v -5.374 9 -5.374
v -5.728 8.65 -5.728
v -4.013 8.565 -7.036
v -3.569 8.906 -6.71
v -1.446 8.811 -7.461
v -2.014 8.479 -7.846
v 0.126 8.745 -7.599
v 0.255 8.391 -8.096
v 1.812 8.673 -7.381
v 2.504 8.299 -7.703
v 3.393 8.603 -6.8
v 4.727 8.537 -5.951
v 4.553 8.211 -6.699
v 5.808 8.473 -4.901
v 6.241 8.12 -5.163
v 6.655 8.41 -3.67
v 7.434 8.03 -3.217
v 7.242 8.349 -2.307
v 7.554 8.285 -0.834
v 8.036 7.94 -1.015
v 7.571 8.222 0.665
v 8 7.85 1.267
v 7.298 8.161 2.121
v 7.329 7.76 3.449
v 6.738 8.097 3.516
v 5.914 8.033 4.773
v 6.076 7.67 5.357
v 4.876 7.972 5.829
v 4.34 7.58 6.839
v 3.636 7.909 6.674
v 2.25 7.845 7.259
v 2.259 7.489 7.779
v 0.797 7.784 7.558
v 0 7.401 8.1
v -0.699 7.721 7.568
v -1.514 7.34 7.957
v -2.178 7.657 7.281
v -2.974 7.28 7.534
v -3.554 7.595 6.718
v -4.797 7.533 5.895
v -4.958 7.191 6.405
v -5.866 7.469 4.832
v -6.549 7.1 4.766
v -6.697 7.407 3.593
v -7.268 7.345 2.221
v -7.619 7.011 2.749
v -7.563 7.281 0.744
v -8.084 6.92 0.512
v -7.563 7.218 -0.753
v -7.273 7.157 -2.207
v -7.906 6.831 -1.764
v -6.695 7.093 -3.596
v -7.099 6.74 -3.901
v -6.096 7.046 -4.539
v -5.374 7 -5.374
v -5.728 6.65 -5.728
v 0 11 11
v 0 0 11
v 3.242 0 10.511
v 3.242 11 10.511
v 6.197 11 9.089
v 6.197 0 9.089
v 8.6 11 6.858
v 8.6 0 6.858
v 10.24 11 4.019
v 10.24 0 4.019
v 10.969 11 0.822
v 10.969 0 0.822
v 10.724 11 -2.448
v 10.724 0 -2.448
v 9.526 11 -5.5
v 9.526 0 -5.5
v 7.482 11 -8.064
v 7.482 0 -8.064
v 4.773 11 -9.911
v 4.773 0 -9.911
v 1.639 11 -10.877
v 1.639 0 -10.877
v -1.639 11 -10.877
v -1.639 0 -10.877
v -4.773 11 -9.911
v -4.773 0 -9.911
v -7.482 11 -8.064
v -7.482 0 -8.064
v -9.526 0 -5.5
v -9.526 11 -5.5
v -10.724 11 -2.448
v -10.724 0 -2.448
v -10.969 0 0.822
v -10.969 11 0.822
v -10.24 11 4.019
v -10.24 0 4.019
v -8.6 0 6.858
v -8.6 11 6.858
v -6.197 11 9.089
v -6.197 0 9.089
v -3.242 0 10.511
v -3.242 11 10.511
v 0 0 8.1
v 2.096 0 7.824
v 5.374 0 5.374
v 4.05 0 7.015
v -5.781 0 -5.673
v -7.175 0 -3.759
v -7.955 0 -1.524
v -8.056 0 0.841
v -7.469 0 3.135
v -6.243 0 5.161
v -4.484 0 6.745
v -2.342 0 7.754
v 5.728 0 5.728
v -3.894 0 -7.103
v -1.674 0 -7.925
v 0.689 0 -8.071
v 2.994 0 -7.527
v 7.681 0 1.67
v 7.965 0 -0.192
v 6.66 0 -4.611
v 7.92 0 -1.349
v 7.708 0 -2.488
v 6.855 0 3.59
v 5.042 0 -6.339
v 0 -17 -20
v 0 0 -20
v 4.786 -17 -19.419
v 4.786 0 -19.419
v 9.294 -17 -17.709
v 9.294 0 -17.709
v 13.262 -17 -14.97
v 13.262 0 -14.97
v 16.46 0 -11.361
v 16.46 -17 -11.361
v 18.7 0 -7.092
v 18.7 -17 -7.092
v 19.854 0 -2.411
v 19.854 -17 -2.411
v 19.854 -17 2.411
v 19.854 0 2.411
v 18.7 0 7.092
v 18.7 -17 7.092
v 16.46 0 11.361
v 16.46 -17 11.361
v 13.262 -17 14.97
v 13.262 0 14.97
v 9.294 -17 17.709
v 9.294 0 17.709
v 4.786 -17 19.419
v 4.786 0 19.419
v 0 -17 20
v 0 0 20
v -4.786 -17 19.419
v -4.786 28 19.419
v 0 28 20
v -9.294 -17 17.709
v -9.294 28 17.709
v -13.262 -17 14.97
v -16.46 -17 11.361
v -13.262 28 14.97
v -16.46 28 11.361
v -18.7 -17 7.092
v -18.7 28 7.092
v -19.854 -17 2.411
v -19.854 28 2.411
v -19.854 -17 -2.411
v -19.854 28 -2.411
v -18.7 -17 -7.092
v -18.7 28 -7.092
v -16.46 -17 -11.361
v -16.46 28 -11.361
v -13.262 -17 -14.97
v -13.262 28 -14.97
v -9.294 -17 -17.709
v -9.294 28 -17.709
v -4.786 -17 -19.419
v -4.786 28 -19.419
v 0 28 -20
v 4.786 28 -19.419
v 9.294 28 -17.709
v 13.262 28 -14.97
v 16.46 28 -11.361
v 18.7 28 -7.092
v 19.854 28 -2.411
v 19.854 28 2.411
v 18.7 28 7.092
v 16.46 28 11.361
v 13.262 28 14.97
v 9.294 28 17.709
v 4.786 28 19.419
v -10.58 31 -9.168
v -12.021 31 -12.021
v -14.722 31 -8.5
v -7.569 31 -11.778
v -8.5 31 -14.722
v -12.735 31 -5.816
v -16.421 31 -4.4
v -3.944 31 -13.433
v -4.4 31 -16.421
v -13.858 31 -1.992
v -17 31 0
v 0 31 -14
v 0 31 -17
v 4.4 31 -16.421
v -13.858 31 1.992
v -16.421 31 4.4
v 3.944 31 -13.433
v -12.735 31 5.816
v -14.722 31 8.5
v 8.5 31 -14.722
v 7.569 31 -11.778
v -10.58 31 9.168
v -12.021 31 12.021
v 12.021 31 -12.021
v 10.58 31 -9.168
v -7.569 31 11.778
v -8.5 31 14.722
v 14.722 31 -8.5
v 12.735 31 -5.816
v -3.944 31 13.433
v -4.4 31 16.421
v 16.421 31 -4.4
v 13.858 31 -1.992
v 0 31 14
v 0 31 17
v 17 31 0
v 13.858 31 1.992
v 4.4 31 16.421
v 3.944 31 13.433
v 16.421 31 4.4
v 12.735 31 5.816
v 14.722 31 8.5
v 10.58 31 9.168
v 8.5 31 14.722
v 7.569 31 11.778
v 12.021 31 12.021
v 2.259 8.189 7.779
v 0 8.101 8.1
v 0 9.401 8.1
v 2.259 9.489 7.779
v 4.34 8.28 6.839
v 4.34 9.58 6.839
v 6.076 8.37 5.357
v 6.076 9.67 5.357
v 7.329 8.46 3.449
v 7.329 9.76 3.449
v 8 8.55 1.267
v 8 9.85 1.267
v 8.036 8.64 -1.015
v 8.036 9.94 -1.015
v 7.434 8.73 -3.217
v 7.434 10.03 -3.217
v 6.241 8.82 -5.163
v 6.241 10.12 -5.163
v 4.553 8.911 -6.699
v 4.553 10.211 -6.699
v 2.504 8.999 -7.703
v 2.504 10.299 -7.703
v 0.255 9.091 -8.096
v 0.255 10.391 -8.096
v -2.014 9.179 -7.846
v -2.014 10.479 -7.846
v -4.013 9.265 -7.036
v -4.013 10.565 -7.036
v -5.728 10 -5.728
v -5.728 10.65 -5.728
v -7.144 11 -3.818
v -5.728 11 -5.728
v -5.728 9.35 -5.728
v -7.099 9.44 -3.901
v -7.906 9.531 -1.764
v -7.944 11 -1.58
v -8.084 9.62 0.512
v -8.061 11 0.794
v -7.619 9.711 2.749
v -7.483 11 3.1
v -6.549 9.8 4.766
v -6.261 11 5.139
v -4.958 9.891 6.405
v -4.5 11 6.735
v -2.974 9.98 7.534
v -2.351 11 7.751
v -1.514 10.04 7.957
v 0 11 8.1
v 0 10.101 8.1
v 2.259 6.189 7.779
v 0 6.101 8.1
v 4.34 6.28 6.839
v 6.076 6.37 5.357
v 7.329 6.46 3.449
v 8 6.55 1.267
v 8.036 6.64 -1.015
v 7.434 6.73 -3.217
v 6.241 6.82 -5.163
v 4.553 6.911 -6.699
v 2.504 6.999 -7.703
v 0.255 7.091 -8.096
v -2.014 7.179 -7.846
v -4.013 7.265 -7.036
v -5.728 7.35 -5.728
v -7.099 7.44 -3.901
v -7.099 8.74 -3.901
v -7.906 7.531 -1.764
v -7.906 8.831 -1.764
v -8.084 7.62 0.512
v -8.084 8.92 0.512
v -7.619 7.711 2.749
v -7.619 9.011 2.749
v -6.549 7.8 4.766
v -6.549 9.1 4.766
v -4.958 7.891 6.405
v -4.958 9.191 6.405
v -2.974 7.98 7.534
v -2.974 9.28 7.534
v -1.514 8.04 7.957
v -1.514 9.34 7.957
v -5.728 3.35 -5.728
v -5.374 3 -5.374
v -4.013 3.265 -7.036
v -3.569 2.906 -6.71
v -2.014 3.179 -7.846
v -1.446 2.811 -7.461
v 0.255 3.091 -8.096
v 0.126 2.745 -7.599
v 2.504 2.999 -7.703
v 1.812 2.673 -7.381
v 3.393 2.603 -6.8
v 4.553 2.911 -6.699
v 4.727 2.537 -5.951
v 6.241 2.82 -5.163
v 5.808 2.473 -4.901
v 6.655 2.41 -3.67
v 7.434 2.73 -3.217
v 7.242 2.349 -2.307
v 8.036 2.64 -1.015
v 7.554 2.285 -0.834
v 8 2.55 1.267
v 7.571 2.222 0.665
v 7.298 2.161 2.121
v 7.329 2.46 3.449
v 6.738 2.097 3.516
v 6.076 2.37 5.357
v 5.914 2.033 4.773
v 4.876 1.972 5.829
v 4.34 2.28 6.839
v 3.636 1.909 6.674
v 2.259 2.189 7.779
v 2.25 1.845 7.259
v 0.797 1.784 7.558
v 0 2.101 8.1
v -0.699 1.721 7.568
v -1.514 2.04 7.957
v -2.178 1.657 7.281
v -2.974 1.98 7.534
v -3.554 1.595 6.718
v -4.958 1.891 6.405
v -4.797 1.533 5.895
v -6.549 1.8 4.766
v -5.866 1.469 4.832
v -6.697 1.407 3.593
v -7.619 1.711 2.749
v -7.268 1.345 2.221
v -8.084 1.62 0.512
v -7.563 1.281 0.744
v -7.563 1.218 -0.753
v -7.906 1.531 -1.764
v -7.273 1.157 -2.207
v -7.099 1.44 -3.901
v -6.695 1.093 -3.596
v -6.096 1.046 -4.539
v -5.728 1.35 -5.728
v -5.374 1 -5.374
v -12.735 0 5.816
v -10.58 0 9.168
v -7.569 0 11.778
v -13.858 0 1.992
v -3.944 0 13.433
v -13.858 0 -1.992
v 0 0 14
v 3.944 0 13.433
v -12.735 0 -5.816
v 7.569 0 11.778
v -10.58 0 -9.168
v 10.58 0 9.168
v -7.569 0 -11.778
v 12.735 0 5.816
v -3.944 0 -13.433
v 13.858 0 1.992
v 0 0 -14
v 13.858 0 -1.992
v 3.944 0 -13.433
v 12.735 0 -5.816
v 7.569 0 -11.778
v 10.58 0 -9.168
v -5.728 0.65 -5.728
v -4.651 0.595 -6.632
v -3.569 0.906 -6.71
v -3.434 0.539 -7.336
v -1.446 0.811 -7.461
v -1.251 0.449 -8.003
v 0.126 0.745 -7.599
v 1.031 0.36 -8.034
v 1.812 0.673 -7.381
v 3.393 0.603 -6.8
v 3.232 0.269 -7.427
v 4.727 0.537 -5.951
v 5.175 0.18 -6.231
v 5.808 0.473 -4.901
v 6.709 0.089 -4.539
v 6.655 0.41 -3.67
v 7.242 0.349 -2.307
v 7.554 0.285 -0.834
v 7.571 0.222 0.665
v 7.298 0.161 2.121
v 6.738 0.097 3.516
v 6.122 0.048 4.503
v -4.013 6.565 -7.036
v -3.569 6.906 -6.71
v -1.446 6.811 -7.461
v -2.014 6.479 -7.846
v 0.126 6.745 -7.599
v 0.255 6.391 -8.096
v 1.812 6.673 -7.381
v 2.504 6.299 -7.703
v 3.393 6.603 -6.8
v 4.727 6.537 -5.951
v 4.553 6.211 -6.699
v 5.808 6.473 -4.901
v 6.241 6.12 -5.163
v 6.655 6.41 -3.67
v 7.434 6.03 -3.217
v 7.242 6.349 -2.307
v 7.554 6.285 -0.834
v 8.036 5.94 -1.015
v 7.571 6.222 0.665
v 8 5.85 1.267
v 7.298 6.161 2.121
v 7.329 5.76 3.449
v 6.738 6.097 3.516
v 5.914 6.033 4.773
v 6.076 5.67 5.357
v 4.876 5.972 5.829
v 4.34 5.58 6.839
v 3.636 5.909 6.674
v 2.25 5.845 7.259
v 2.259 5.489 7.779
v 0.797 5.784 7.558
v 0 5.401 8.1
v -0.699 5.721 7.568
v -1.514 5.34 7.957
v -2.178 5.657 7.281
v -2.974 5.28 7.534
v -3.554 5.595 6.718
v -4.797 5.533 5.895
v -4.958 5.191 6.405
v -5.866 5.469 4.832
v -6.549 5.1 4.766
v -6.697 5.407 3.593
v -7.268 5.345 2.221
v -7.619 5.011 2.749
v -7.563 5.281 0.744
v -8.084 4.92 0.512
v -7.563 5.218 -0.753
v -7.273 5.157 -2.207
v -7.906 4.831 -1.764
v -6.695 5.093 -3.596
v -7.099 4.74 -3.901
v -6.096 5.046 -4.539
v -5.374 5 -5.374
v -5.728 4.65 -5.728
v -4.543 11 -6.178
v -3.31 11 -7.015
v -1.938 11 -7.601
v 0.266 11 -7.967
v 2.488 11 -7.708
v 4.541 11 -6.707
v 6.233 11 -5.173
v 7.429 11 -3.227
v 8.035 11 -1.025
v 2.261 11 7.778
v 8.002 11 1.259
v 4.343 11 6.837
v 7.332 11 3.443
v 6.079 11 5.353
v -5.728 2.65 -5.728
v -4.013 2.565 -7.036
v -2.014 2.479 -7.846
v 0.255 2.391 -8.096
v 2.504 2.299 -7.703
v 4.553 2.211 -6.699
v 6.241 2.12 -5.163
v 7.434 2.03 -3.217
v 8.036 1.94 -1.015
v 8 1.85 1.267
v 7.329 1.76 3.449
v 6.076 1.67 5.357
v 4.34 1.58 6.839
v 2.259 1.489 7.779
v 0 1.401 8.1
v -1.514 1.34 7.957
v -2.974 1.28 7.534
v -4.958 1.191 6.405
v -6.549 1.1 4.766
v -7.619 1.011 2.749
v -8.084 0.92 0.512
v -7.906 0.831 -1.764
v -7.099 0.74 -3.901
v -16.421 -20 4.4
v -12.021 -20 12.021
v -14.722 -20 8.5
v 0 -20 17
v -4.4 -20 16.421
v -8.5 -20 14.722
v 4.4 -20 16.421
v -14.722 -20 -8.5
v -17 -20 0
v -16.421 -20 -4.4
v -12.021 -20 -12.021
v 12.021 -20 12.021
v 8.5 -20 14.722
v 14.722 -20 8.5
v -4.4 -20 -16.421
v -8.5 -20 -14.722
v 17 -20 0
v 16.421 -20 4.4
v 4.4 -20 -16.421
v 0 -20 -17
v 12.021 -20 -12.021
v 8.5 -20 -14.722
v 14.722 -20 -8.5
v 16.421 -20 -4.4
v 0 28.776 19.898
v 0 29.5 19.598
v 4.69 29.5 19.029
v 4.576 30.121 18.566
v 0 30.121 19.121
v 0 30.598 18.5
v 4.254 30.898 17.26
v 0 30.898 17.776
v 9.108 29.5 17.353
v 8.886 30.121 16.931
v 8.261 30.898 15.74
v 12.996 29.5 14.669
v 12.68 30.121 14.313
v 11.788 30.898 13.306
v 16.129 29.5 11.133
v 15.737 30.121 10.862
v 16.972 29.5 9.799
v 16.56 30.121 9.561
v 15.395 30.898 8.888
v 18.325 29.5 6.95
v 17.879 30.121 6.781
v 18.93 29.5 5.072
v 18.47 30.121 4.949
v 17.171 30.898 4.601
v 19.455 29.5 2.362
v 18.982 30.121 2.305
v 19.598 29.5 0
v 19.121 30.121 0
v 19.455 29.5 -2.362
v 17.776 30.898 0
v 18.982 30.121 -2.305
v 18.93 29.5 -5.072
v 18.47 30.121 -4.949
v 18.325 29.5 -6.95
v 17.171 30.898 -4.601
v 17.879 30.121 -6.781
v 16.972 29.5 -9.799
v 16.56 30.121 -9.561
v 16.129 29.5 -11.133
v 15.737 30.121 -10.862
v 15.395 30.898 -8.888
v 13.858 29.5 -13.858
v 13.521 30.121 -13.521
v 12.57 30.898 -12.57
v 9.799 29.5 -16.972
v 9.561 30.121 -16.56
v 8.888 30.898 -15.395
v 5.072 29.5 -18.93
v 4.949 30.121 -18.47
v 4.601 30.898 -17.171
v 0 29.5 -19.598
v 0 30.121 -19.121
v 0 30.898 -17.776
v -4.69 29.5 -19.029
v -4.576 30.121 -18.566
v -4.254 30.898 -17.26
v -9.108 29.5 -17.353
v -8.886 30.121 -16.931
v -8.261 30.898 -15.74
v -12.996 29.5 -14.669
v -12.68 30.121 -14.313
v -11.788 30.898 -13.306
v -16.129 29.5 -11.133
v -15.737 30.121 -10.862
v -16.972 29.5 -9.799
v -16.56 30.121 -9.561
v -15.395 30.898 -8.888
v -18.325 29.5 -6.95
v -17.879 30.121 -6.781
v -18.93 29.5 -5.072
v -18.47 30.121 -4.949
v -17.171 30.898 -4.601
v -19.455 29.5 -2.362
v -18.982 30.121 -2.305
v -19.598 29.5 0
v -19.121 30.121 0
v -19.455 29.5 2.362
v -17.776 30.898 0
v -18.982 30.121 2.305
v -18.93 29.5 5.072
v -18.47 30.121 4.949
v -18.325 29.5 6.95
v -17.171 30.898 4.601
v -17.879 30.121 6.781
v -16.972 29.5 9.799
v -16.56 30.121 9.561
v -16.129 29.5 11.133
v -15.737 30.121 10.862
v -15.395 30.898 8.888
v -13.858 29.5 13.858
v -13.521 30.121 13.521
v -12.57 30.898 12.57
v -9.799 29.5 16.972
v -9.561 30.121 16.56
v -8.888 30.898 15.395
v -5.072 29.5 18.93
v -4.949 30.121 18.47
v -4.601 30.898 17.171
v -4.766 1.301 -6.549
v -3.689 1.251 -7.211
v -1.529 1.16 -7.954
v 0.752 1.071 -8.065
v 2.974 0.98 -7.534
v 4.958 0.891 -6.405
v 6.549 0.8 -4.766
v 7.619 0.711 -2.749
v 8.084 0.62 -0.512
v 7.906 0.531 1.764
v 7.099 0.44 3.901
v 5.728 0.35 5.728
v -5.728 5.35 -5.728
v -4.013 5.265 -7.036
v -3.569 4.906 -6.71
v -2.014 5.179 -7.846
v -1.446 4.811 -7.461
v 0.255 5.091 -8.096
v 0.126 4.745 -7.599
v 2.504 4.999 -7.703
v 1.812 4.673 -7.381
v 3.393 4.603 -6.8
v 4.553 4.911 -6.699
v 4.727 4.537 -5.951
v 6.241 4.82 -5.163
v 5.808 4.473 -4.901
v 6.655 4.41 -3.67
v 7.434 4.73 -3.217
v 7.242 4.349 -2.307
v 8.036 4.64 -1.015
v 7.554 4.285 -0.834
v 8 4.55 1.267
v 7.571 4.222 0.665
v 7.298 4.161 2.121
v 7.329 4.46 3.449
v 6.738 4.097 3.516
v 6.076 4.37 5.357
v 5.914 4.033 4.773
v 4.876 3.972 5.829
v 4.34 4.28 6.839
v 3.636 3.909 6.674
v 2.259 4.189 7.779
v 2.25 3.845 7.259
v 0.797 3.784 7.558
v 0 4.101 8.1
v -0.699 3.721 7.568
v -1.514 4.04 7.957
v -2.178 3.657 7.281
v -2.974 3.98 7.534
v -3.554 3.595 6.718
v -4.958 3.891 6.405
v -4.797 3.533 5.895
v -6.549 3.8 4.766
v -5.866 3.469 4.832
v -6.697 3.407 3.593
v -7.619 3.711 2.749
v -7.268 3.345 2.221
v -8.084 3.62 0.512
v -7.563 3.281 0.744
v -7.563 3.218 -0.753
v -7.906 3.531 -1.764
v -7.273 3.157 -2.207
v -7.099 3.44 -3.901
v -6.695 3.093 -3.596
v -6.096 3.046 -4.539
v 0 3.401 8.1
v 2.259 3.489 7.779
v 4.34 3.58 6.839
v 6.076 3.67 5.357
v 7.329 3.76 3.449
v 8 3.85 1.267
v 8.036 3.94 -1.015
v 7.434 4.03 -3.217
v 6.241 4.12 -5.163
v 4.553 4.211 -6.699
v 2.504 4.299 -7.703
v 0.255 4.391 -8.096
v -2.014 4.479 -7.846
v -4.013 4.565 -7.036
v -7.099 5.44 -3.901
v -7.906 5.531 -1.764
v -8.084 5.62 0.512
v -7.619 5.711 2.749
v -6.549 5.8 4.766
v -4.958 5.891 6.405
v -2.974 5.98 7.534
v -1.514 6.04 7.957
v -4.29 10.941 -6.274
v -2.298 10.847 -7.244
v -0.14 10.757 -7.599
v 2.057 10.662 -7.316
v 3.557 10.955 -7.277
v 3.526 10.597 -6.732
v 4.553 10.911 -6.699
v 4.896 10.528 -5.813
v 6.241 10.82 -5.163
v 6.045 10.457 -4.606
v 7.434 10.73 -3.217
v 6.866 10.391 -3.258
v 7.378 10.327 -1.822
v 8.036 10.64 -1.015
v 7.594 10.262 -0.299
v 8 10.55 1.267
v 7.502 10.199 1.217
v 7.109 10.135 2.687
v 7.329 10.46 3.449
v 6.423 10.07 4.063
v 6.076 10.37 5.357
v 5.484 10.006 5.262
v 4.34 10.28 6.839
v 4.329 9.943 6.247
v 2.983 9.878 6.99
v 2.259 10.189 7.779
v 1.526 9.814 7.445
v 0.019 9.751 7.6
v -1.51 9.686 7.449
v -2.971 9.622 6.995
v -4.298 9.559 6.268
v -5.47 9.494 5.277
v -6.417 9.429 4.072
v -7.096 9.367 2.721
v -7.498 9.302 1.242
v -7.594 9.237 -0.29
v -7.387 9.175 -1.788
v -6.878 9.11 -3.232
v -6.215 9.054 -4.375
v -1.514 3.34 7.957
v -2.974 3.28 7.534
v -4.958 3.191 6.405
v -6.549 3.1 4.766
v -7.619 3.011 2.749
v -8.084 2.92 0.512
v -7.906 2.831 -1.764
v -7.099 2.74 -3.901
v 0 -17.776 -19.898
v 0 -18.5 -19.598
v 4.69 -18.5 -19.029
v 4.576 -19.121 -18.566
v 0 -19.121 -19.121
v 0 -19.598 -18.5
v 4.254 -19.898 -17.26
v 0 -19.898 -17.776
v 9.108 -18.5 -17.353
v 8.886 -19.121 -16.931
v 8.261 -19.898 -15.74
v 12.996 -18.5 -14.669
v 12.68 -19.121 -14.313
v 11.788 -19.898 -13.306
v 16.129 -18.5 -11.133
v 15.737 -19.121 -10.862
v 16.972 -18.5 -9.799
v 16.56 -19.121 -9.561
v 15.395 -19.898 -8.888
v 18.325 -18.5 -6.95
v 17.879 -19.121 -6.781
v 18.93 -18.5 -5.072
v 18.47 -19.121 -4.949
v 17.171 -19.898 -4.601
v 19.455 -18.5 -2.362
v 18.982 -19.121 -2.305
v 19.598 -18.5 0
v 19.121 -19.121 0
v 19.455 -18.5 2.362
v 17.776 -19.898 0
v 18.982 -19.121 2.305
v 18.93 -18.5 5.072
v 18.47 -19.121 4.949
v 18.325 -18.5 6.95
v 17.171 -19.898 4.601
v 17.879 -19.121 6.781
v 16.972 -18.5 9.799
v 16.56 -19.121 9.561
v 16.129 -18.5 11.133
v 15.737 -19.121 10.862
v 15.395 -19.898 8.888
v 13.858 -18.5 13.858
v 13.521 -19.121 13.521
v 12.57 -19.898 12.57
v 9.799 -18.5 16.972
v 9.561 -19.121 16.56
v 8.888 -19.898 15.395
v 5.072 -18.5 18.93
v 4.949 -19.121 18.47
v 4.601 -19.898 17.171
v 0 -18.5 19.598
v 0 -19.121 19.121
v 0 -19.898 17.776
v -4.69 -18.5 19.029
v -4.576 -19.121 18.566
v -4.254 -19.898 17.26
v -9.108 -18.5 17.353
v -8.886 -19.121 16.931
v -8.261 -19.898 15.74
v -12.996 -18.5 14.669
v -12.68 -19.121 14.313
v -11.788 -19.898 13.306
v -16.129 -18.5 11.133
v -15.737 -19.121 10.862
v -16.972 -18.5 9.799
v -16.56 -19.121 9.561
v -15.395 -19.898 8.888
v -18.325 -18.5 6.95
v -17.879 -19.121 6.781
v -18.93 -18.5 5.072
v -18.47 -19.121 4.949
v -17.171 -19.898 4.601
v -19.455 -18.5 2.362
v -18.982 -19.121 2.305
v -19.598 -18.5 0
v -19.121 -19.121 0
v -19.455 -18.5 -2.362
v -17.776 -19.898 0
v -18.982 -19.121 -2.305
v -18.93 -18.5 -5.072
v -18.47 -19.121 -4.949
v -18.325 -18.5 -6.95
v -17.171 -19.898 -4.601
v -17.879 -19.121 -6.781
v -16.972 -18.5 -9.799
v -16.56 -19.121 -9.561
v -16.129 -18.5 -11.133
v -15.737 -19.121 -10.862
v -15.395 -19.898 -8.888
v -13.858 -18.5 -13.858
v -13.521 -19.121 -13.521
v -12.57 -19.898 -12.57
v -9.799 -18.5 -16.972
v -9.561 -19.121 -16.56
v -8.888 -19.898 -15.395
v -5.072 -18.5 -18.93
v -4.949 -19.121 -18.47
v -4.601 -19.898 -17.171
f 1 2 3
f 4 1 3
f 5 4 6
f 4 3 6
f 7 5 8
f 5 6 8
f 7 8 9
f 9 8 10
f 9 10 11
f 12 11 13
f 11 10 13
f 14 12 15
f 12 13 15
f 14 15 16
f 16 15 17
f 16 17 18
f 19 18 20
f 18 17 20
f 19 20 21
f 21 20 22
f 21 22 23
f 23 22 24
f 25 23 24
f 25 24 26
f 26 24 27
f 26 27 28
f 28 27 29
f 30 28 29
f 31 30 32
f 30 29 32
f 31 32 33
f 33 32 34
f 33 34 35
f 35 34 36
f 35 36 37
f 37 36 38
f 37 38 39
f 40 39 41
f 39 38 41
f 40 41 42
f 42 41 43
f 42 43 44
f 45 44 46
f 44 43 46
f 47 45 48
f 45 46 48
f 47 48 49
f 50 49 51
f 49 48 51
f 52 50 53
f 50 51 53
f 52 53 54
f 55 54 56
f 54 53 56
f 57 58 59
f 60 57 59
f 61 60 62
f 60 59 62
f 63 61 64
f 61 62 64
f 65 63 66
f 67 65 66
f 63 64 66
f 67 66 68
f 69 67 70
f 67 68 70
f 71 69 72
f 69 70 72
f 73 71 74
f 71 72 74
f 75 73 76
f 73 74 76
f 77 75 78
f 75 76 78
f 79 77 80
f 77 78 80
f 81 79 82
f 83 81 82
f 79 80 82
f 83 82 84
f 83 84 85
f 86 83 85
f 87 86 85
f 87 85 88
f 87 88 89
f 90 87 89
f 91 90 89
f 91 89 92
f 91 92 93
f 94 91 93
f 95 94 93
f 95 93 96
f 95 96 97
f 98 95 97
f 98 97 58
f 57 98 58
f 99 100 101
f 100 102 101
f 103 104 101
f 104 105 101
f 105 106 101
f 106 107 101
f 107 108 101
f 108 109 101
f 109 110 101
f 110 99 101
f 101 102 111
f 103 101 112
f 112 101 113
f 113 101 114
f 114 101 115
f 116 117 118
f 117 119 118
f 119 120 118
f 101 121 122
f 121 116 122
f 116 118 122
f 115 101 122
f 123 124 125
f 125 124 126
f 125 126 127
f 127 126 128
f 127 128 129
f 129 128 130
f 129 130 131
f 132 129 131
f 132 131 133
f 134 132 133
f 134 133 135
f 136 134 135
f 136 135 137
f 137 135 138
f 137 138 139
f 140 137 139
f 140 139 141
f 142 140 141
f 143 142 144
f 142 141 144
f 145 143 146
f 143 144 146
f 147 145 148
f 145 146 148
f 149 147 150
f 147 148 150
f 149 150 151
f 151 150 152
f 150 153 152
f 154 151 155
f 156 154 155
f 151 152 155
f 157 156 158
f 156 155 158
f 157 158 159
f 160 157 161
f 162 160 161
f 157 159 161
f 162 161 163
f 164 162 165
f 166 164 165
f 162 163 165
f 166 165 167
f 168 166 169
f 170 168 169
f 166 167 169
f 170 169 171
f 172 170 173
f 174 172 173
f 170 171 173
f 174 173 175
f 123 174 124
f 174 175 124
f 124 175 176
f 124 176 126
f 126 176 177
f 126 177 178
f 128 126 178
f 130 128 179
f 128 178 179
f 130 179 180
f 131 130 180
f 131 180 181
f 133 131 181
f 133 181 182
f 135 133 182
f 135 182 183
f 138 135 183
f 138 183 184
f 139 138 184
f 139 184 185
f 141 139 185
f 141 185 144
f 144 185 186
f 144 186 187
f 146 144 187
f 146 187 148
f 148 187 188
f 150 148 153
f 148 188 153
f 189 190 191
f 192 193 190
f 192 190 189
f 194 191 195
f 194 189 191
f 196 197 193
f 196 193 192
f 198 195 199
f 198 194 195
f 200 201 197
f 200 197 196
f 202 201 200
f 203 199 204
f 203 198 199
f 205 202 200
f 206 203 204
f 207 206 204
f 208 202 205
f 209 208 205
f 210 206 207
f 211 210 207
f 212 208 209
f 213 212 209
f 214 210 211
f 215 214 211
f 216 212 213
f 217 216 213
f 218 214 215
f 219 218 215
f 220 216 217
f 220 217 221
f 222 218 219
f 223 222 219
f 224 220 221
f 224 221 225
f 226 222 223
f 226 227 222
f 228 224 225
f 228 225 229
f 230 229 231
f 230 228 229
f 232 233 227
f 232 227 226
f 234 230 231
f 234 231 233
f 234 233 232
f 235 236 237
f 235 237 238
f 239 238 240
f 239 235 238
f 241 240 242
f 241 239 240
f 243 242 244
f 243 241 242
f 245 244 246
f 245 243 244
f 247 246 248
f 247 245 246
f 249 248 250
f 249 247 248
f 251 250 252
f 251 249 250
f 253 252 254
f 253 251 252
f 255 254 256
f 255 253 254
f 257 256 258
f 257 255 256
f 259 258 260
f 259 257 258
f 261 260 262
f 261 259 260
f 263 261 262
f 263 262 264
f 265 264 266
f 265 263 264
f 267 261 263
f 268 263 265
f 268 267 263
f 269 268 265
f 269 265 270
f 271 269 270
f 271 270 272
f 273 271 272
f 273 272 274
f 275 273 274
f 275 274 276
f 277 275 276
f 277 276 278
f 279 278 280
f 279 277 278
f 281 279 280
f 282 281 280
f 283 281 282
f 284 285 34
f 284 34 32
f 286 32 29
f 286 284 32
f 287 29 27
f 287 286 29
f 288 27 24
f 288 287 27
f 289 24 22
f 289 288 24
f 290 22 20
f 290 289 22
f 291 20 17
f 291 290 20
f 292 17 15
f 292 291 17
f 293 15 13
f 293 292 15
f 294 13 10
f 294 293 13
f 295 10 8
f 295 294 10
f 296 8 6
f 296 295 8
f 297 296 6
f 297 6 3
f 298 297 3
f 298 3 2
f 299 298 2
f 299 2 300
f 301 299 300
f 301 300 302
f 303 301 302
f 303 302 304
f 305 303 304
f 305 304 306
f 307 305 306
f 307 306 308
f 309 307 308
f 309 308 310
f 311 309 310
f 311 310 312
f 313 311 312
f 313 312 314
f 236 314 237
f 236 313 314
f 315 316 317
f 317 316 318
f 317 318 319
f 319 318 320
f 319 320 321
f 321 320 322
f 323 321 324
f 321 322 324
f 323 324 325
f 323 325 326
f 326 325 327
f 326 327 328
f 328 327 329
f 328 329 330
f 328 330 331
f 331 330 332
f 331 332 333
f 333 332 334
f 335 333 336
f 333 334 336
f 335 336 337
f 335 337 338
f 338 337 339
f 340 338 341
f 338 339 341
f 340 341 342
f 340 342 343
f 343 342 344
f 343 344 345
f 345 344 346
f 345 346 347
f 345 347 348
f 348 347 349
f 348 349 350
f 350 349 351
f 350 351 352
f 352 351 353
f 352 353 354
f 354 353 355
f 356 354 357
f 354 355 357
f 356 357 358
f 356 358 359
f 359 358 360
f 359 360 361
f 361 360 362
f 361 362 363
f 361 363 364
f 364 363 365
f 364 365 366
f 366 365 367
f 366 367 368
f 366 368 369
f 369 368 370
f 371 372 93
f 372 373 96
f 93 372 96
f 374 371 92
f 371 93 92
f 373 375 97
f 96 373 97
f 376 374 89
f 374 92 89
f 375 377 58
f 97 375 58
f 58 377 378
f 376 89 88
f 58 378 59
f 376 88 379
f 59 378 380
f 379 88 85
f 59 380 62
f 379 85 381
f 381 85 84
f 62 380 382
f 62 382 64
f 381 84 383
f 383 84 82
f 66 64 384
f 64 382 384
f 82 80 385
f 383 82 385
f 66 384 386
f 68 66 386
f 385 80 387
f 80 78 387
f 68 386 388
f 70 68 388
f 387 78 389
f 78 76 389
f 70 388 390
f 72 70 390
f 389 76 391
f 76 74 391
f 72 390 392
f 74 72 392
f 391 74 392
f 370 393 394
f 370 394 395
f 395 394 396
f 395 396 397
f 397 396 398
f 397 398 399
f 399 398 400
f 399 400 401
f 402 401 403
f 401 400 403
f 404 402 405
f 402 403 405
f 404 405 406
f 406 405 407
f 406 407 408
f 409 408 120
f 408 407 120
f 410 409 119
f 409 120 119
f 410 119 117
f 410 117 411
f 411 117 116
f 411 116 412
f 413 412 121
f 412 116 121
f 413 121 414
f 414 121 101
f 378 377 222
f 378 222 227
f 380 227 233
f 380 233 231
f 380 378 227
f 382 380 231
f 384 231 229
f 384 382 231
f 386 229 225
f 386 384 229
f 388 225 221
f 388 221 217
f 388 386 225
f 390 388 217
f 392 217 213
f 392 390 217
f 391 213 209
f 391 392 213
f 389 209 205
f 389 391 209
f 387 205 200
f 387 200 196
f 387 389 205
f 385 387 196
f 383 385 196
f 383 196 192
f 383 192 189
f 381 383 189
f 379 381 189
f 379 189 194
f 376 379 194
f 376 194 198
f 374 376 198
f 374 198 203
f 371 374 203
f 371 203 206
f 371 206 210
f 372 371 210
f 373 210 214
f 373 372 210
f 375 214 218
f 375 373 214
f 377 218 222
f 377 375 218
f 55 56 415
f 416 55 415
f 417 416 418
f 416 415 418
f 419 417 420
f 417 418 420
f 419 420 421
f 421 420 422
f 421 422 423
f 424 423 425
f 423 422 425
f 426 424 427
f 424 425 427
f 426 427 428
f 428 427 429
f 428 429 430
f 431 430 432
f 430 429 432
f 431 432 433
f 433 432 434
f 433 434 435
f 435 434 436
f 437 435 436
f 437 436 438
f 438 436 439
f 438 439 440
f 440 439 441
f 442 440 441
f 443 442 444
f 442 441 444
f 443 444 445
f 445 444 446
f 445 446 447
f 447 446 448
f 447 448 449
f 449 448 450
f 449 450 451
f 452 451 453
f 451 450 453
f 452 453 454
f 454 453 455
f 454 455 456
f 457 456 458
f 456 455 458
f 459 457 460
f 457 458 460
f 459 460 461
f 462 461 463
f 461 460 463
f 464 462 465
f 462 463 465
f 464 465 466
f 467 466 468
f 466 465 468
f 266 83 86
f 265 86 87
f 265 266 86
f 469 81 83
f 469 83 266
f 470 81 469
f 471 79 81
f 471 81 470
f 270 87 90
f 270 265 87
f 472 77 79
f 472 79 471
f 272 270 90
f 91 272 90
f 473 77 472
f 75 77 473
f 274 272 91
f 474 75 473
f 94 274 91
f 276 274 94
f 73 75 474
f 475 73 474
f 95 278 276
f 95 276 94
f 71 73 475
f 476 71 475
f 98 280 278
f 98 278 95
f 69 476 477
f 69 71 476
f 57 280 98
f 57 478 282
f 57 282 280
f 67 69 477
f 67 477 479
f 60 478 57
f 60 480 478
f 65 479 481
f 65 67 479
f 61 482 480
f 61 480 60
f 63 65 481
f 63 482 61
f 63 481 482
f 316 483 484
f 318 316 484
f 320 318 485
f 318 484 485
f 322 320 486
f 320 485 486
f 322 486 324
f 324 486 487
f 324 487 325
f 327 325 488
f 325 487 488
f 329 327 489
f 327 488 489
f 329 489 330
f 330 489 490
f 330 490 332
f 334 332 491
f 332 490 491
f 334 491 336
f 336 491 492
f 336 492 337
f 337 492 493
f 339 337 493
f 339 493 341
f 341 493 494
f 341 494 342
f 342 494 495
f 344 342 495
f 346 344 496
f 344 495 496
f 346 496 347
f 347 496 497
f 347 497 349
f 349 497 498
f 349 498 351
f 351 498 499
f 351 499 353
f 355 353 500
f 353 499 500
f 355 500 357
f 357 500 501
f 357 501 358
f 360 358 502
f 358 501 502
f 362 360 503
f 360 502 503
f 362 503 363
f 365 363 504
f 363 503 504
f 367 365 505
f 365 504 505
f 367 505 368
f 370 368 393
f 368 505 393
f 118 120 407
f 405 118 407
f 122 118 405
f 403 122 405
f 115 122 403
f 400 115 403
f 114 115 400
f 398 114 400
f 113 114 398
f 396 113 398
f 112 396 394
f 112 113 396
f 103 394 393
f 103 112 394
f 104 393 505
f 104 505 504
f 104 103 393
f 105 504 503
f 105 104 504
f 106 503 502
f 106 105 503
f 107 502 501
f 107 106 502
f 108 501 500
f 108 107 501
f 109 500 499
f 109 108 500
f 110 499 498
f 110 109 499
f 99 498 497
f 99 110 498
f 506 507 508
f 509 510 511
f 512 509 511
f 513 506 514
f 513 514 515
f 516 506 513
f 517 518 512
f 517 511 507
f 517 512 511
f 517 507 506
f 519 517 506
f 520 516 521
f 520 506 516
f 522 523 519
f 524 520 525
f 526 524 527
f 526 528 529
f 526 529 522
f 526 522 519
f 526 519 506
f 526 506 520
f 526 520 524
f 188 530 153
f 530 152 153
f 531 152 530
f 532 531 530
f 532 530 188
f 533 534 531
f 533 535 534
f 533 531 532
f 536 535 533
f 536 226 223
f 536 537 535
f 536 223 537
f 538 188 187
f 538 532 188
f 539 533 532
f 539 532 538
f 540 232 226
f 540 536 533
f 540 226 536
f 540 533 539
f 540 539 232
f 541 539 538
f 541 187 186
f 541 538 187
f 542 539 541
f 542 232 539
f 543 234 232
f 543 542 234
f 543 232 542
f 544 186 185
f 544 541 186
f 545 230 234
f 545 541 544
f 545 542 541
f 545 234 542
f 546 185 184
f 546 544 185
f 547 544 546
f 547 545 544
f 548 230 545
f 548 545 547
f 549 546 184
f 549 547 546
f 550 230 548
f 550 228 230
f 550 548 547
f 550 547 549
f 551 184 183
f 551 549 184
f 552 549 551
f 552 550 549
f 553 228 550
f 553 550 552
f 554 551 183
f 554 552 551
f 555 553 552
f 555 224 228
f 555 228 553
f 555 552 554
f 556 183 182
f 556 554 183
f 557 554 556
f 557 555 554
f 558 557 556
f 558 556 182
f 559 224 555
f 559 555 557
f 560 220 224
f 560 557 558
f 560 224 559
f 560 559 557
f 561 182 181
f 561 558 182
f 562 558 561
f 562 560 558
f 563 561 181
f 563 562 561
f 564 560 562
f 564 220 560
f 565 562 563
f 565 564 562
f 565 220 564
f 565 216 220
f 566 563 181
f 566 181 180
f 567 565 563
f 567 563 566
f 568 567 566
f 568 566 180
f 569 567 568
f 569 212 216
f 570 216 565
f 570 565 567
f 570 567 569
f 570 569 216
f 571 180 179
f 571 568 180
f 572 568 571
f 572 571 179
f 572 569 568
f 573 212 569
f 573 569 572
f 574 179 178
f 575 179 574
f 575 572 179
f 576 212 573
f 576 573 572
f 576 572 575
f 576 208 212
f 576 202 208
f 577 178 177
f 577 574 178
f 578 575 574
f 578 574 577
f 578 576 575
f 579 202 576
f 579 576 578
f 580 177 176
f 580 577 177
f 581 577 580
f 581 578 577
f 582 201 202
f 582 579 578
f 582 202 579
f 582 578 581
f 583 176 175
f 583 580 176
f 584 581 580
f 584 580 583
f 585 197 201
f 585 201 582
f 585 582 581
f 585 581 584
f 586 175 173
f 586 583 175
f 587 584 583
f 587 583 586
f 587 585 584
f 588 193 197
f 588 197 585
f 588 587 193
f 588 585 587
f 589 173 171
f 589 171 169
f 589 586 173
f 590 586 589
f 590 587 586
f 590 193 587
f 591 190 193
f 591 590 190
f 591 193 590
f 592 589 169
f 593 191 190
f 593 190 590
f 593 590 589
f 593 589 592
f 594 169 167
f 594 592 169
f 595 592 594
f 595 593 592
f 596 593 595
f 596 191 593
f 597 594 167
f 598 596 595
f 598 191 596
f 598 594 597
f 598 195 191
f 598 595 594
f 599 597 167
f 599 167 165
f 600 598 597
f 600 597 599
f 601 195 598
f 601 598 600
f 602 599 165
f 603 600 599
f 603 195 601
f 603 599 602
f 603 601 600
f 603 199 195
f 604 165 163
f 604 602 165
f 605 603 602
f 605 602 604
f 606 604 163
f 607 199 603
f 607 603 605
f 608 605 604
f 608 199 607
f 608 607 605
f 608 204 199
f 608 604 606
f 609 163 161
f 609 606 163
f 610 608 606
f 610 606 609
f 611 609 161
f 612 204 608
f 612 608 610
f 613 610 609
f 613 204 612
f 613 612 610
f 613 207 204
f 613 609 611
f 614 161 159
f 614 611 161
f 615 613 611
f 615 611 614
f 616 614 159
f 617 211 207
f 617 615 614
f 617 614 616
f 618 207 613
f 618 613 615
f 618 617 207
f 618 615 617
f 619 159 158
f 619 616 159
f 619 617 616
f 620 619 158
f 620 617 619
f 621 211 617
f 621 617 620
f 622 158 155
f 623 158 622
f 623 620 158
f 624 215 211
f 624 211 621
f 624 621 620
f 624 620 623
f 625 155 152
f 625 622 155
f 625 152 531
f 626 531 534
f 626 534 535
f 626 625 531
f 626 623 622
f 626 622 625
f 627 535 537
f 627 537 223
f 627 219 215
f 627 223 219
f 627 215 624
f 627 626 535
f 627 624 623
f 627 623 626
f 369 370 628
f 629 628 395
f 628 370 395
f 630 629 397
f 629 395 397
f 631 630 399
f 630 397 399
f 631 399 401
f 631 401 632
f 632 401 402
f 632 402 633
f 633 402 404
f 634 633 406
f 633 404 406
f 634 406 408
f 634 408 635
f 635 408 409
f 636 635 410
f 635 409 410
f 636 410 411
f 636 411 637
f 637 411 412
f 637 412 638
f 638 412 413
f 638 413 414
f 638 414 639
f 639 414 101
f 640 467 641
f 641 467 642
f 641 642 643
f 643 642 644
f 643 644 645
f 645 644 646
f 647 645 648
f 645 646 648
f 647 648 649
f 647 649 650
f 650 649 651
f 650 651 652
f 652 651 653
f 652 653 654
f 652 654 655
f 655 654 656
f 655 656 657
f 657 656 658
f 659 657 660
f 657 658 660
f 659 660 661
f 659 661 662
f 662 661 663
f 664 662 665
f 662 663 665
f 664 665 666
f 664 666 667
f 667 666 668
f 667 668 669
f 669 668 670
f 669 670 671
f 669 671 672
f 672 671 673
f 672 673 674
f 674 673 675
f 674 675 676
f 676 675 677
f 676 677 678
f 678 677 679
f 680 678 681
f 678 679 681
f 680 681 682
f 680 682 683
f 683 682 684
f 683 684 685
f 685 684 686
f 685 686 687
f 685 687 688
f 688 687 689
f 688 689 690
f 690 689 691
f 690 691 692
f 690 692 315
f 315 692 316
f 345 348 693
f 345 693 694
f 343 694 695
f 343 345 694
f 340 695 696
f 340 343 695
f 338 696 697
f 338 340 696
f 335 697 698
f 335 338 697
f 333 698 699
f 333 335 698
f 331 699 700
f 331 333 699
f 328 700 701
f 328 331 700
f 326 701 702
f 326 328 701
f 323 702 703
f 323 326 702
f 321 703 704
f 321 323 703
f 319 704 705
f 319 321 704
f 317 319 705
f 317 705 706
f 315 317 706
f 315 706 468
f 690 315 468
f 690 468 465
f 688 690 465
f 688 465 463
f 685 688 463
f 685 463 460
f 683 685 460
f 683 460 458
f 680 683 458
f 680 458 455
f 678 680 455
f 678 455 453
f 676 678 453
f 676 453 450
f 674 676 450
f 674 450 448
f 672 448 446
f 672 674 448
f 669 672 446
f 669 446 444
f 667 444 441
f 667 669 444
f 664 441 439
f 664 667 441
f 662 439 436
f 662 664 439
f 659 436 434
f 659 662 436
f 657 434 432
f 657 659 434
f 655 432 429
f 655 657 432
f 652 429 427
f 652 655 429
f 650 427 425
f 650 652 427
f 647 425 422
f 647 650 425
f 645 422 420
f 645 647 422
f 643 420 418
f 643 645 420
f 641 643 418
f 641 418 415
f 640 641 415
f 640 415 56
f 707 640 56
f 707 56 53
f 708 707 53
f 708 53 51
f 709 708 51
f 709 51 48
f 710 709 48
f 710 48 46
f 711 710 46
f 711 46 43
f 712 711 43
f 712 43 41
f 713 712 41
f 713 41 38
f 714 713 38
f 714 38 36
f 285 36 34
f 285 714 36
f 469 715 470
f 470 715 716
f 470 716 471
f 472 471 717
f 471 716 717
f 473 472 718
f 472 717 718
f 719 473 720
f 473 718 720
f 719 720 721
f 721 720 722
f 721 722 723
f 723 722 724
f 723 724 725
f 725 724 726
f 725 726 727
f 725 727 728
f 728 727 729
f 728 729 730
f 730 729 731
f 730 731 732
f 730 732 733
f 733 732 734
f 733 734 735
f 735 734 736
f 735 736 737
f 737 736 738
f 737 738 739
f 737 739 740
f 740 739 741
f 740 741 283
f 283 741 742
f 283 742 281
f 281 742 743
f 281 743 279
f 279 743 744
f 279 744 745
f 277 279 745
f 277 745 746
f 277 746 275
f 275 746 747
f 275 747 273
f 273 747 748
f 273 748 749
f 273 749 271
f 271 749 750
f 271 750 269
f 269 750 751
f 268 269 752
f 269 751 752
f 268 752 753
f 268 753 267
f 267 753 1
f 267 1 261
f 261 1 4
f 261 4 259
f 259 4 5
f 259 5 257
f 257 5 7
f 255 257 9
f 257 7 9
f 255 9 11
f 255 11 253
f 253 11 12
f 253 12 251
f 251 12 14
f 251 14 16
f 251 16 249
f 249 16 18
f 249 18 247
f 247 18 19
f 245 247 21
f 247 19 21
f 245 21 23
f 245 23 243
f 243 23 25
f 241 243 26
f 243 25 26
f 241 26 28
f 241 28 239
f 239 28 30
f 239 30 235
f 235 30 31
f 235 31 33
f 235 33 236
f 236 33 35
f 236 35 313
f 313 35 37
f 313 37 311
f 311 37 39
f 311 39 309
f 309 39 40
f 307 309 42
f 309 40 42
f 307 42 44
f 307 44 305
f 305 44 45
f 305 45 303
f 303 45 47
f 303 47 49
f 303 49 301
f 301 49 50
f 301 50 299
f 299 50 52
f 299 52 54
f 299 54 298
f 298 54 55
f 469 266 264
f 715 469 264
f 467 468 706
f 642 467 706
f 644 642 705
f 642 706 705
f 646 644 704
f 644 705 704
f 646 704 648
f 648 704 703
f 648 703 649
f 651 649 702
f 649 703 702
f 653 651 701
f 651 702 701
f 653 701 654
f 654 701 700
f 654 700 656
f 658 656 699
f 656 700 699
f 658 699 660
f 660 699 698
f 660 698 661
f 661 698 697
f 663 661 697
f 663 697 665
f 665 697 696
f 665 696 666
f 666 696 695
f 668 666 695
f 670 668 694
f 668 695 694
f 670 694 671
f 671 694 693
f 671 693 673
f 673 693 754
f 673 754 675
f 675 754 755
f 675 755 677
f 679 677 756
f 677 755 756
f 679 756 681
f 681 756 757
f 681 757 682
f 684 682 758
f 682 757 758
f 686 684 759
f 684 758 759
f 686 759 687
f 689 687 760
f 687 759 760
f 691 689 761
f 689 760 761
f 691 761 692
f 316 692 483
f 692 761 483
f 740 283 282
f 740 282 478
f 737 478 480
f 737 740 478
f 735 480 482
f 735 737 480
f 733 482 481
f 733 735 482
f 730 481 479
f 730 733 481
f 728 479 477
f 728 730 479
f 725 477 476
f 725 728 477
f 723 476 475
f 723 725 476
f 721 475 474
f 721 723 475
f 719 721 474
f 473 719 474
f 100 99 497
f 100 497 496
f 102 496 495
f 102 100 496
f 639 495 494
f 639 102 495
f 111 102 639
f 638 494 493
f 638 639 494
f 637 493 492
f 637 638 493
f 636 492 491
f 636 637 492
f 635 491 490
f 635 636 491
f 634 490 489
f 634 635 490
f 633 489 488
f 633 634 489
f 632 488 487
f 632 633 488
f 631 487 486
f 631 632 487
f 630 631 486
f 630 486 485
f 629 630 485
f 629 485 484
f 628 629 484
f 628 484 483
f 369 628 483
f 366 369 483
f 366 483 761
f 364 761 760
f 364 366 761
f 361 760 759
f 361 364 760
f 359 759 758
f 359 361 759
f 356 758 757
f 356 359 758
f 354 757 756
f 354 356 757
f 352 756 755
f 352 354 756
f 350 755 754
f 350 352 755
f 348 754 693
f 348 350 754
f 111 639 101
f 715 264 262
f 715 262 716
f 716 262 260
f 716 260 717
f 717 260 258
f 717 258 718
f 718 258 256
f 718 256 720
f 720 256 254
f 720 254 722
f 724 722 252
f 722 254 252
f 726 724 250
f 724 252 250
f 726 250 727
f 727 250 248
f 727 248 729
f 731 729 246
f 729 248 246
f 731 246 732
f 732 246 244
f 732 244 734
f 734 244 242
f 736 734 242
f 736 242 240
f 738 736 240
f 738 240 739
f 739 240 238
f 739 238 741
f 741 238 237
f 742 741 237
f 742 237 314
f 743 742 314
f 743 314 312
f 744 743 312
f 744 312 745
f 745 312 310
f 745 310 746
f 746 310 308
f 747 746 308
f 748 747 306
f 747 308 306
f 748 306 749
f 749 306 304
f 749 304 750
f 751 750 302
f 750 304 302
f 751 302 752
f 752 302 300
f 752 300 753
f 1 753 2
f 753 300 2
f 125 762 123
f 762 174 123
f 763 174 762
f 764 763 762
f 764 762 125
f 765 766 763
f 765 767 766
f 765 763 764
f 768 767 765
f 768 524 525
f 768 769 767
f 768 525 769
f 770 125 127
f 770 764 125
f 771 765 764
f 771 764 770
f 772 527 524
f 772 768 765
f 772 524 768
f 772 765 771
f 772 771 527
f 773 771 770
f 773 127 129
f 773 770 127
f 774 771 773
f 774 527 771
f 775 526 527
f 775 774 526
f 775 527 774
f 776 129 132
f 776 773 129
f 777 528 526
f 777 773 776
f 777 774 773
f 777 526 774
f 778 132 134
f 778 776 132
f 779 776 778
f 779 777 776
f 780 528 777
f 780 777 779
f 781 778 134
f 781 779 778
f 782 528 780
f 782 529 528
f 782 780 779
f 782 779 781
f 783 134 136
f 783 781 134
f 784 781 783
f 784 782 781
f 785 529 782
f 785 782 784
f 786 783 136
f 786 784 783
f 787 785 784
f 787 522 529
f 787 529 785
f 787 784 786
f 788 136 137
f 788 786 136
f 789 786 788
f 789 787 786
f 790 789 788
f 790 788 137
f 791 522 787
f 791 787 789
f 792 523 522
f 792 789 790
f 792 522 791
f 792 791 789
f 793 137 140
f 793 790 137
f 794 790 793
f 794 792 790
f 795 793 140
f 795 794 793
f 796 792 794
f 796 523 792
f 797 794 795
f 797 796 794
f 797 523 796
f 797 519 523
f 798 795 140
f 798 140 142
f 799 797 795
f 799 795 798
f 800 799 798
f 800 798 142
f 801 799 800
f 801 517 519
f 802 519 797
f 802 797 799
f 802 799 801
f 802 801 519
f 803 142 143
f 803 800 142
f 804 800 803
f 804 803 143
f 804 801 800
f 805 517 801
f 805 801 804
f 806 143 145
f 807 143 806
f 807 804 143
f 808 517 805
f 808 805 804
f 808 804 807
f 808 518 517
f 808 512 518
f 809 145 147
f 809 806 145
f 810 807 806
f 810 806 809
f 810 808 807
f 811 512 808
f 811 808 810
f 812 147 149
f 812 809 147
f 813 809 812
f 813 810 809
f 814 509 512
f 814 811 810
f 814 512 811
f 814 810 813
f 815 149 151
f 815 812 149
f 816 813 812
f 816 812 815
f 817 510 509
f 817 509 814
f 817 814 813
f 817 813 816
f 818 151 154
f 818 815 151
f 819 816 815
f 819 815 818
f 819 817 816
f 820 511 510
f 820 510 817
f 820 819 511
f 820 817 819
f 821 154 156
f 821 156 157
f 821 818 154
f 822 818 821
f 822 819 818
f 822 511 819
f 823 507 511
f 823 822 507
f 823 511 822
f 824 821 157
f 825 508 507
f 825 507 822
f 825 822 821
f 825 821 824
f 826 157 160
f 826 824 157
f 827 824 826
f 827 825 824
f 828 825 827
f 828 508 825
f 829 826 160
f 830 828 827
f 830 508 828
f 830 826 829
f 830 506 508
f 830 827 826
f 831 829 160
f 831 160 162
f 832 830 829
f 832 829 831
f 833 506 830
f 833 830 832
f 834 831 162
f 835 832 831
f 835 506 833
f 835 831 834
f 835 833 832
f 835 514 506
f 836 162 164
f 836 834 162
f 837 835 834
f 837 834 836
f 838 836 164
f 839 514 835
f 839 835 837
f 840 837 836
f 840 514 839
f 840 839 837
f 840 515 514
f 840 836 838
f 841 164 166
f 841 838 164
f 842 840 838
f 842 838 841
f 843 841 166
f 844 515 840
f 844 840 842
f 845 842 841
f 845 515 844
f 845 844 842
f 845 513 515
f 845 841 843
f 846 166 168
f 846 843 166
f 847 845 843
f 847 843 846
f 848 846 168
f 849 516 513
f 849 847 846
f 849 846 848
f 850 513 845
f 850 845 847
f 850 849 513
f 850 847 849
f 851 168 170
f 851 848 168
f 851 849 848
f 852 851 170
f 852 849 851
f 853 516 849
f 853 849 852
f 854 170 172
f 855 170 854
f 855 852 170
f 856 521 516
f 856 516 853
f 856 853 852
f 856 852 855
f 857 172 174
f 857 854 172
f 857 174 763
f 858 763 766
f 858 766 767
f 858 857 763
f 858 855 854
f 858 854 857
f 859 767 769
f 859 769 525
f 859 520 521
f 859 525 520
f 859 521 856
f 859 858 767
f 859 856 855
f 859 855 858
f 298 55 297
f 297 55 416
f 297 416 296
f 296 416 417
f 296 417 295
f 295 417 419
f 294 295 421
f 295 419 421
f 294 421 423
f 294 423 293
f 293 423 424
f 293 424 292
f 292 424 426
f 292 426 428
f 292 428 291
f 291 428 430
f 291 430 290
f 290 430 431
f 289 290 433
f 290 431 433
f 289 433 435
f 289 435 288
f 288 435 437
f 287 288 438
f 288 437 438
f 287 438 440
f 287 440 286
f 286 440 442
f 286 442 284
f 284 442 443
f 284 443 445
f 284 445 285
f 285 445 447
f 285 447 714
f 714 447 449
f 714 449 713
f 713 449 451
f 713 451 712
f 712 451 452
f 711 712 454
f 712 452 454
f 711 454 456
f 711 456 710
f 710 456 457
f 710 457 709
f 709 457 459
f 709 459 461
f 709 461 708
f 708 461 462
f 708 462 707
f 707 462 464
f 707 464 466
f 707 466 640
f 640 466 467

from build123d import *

# Parameters (mm, degrees)
SKETCH_1_R               = 11
SKETCH_1_R_2             = 8.1
EXTRUDE_1_DEPTH          = 11
SWEEP_2_PITCH            = 2
CUT_EXTRUDE_1_DEPTH      = 20.256876011
CUT_EXTRUDE_1_DEPTH_BACK = 20.256876011
SKETCH_8_W               = 20.965644498
SKETCH_8_H               = 3.347195004
CUT_EXTRUDE_2_DEPTH      = 1
SKETCH_1_3_R             = 20
SKETCH_1_3_R_2           = 14
EXTRUDE_2_DEPTH          = 31
SKETCH_2_R               = 20
EXTRUDE_4_DEPTH          = 20
FILLET_1_R               = 3


with BuildPart() as part:
    # 草图1 → 凸台-拉伸1 (new body)
    with BuildSketch(Plane(origin=(0, 0, 0), x_dir=(1, 0, 0), z_dir=(0, 1, 0))):
        with Locations(Location((0, 0, 0), (0, 0, 270))):
            Circle(SKETCH_1_R)
        with Locations(Location((0, 0, 0), (0, 0, 270))):
            Circle(SKETCH_1_R_2, mode=Mode.SUBTRACT)
    extrude(amount=EXTRUDE_1_DEPTH)

    # 扫描2: the profile of 草图7 profile screwed along a right-hand helix of 5.5 turns, 10 arcs to a turn; built about Z, then put on its axis
    sweep_2_z = Axis((0, 0, 0), (0, 0, 1))
    sweep_2_corners = [(8.1003, 0, 0.35021), (8.1003, 0, -0.35021), (7.6, 0, 0)]
    with BuildLine(mode=Mode.PRIVATE) as sweep_2_profile:
        Line(sweep_2_corners[0], sweep_2_corners[1])
        Line(sweep_2_corners[1], sweep_2_corners[2])
        Line(sweep_2_corners[2], sweep_2_corners[0])
    sweep_2_cap = Face(sweep_2_profile.wire())
    sweep_2_turn_angles = [0, 18, 36, 54, 72, 90, 108, 126, 144, 162, 180, 198, 216, 234, 252, 270, 288, 306, 324, 342, 360]
    sweep_2_turn_weights = [1, 0.9510565162951535, 1, 0.9510565162951535, 1, 0.9510565162951535, 1, 0.9510565162951535, 1, 0.9510565162951535, 1, 0.9510565162951535, 1, 0.9510565162951535, 1, 0.9510565162951535, 1, 0.9510565162951535, 1, 0.9510565162951535, 1]
    sweep_2_turn_rails = [Edge.make_bspline([Vector(p[0], p[1], 0).rotate(sweep_2_z, sweep_2_turn_angles[k]) / sweep_2_turn_weights[k] + Vector(0, 0, p[2] + SWEEP_2_PITCH * sweep_2_turn_angles[k] / 360) for k in range(21)], [0, 0, 0, 1, 1, 2, 2, 3, 3, 4, 4, 5, 5, 6, 6, 7, 7, 8, 8, 9, 9, 10, 10, 10], 2, sweep_2_turn_weights) for p in sweep_2_corners]
    sweep_2_turn_sides = [Face.make_surface_from_curves(sweep_2_turn_rails[p[0]], sweep_2_turn_rails[p[1]]) for p in [(0, 1), (1, 2), (2, 0)]]
    sweep_2_last_angles = [1800, 1818, 1836, 1854, 1872, 1890, 1908, 1926, 1944, 1962, 1980]
    sweep_2_last_weights = [1, 0.9510565162951535, 1, 0.9510565162951535, 1, 0.9510565162951535, 1, 0.9510565162951535, 1, 0.9510565162951394, 1]
    sweep_2_last_rails = [Edge.make_bspline([Vector(p[0], p[1], 0).rotate(sweep_2_z, sweep_2_last_angles[k]) / sweep_2_last_weights[k] + Vector(0, 0, p[2] + SWEEP_2_PITCH * sweep_2_last_angles[k] / 360) for k in range(11)], [0, 0, 0, 1, 1, 2, 2, 3, 3, 4, 4, 5, 5, 5], 2, sweep_2_last_weights) for p in sweep_2_corners]
    sweep_2_last_sides = [Face.make_surface_from_curves(sweep_2_last_rails[p[0]], sweep_2_last_rails[p[1]]) for p in [(0, 1), (1, 2), (2, 0)]]
    sweep_2 = Plane(origin=(0, 11, 0), x_dir=(-0.7071067811865537, 0, -0.7071067811865414), z_dir=(0, -1, 0)) * Solid(Shell([*[p.moved(Location((0, 0, SWEEP_2_PITCH * i))) for i in range(5) for p in sweep_2_turn_sides], *sweep_2_last_sides, sweep_2_cap, sweep_2_cap.rotate(sweep_2_z, 1980).moved(Location((0, 0, SWEEP_2_PITCH * 1980 / 360)))]))
    add(sweep_2)

    # 草图8 → 切除-拉伸1 (cut, two sides: drawn at the far end of the back side and taken through both)
    with BuildSketch(Plane(origin=(0, 0, 0), x_dir=(-0.7071067811865536, 0, -0.7071067811865416), z_dir=(0.7071067811865416, 0, -0.7071067811865536)).offset(-CUT_EXTRUDE_1_DEPTH_BACK)):
        with Locations((0.517177751, 12.673597502)):
            Rectangle(SKETCH_8_W, SKETCH_8_H)
    extrude(amount=CUT_EXTRUDE_1_DEPTH + CUT_EXTRUDE_1_DEPTH_BACK, mode=Mode.SUBTRACT)

    # 草图9 → 切除-拉伸2 (cut)
    with BuildSketch(Plane(origin=(0, 11, 0), x_dir=(1, 0, 0), z_dir=(0, 1, 0))):
        Polygon((-5.727564928, 5.727564928), (-4.090744655, 6.349136352), (-5.001356228, 5.001356228), align=None)
    extrude(amount=-CUT_EXTRUDE_2_DEPTH, mode=Mode.SUBTRACT)



with BuildPart() as body_2:
    # 草图1<3> → 凸台-拉伸2 (new body)
    with BuildSketch(Plane(origin=(0, 0, 0), x_dir=(1, 0, 0), z_dir=(0, 1, 0))):
        with Locations(Location((0, 0, 0), (0, 0, 270))):
            Circle(SKETCH_1_3_R)
        with Locations(Location((0, 0, 0), (0, 0, 270))):
            Circle(SKETCH_1_3_R_2, mode=Mode.SUBTRACT)
    extrude(amount=EXTRUDE_2_DEPTH)


with BuildPart() as part_1:
    add(part.part)

    add(body_2.part)  # 凸台-拉伸4 merges body 2
    # 草图2 → 凸台-拉伸4 (add)
    with BuildSketch(Plane.XZ):
        with Locations(Location((0, 0, 0), (0, 0, 270))):
            Circle(SKETCH_2_R)
    extrude(amount=EXTRUDE_4_DEPTH)

    # 圆角1
    # the kernel refuses this fillet: 3 mm, written as the material it takes off along each edge
    with BuildSketch(Plane(origin=(0, 31, 0), x_dir=(0, 0, 1), z_dir=(-1, 0, 0))) as fillet_1_piece_1:
        with BuildLine():
            CenterArc((20 - FILLET_1_R, -FILLET_1_R), FILLET_1_R, 0, 90)
            Line((20, -FILLET_1_R), (20, 0))
            Line((20, 0), (20 - FILLET_1_R, 0))
        make_face()
    revolve(axis=Axis((0, 31, 0), (0, 1, 0)), mode=Mode.SUBTRACT)
    with BuildSketch(Plane(origin=(0, -20, 0), x_dir=(0, 0, -1), z_dir=(-1, 0, 0))) as fillet_1_piece_2:
        with BuildLine():
            CenterArc((20 - FILLET_1_R, -FILLET_1_R), FILLET_1_R, 0, 90)
            Line((20 - FILLET_1_R, 0), (20, 0))
            Line((20, 0), (20, -FILLET_1_R))
        make_face()
    revolve(axis=Axis((0, -20, 0), (0, -1, 0)), mode=Mode.SUBTRACT)


solid = part_1.part
